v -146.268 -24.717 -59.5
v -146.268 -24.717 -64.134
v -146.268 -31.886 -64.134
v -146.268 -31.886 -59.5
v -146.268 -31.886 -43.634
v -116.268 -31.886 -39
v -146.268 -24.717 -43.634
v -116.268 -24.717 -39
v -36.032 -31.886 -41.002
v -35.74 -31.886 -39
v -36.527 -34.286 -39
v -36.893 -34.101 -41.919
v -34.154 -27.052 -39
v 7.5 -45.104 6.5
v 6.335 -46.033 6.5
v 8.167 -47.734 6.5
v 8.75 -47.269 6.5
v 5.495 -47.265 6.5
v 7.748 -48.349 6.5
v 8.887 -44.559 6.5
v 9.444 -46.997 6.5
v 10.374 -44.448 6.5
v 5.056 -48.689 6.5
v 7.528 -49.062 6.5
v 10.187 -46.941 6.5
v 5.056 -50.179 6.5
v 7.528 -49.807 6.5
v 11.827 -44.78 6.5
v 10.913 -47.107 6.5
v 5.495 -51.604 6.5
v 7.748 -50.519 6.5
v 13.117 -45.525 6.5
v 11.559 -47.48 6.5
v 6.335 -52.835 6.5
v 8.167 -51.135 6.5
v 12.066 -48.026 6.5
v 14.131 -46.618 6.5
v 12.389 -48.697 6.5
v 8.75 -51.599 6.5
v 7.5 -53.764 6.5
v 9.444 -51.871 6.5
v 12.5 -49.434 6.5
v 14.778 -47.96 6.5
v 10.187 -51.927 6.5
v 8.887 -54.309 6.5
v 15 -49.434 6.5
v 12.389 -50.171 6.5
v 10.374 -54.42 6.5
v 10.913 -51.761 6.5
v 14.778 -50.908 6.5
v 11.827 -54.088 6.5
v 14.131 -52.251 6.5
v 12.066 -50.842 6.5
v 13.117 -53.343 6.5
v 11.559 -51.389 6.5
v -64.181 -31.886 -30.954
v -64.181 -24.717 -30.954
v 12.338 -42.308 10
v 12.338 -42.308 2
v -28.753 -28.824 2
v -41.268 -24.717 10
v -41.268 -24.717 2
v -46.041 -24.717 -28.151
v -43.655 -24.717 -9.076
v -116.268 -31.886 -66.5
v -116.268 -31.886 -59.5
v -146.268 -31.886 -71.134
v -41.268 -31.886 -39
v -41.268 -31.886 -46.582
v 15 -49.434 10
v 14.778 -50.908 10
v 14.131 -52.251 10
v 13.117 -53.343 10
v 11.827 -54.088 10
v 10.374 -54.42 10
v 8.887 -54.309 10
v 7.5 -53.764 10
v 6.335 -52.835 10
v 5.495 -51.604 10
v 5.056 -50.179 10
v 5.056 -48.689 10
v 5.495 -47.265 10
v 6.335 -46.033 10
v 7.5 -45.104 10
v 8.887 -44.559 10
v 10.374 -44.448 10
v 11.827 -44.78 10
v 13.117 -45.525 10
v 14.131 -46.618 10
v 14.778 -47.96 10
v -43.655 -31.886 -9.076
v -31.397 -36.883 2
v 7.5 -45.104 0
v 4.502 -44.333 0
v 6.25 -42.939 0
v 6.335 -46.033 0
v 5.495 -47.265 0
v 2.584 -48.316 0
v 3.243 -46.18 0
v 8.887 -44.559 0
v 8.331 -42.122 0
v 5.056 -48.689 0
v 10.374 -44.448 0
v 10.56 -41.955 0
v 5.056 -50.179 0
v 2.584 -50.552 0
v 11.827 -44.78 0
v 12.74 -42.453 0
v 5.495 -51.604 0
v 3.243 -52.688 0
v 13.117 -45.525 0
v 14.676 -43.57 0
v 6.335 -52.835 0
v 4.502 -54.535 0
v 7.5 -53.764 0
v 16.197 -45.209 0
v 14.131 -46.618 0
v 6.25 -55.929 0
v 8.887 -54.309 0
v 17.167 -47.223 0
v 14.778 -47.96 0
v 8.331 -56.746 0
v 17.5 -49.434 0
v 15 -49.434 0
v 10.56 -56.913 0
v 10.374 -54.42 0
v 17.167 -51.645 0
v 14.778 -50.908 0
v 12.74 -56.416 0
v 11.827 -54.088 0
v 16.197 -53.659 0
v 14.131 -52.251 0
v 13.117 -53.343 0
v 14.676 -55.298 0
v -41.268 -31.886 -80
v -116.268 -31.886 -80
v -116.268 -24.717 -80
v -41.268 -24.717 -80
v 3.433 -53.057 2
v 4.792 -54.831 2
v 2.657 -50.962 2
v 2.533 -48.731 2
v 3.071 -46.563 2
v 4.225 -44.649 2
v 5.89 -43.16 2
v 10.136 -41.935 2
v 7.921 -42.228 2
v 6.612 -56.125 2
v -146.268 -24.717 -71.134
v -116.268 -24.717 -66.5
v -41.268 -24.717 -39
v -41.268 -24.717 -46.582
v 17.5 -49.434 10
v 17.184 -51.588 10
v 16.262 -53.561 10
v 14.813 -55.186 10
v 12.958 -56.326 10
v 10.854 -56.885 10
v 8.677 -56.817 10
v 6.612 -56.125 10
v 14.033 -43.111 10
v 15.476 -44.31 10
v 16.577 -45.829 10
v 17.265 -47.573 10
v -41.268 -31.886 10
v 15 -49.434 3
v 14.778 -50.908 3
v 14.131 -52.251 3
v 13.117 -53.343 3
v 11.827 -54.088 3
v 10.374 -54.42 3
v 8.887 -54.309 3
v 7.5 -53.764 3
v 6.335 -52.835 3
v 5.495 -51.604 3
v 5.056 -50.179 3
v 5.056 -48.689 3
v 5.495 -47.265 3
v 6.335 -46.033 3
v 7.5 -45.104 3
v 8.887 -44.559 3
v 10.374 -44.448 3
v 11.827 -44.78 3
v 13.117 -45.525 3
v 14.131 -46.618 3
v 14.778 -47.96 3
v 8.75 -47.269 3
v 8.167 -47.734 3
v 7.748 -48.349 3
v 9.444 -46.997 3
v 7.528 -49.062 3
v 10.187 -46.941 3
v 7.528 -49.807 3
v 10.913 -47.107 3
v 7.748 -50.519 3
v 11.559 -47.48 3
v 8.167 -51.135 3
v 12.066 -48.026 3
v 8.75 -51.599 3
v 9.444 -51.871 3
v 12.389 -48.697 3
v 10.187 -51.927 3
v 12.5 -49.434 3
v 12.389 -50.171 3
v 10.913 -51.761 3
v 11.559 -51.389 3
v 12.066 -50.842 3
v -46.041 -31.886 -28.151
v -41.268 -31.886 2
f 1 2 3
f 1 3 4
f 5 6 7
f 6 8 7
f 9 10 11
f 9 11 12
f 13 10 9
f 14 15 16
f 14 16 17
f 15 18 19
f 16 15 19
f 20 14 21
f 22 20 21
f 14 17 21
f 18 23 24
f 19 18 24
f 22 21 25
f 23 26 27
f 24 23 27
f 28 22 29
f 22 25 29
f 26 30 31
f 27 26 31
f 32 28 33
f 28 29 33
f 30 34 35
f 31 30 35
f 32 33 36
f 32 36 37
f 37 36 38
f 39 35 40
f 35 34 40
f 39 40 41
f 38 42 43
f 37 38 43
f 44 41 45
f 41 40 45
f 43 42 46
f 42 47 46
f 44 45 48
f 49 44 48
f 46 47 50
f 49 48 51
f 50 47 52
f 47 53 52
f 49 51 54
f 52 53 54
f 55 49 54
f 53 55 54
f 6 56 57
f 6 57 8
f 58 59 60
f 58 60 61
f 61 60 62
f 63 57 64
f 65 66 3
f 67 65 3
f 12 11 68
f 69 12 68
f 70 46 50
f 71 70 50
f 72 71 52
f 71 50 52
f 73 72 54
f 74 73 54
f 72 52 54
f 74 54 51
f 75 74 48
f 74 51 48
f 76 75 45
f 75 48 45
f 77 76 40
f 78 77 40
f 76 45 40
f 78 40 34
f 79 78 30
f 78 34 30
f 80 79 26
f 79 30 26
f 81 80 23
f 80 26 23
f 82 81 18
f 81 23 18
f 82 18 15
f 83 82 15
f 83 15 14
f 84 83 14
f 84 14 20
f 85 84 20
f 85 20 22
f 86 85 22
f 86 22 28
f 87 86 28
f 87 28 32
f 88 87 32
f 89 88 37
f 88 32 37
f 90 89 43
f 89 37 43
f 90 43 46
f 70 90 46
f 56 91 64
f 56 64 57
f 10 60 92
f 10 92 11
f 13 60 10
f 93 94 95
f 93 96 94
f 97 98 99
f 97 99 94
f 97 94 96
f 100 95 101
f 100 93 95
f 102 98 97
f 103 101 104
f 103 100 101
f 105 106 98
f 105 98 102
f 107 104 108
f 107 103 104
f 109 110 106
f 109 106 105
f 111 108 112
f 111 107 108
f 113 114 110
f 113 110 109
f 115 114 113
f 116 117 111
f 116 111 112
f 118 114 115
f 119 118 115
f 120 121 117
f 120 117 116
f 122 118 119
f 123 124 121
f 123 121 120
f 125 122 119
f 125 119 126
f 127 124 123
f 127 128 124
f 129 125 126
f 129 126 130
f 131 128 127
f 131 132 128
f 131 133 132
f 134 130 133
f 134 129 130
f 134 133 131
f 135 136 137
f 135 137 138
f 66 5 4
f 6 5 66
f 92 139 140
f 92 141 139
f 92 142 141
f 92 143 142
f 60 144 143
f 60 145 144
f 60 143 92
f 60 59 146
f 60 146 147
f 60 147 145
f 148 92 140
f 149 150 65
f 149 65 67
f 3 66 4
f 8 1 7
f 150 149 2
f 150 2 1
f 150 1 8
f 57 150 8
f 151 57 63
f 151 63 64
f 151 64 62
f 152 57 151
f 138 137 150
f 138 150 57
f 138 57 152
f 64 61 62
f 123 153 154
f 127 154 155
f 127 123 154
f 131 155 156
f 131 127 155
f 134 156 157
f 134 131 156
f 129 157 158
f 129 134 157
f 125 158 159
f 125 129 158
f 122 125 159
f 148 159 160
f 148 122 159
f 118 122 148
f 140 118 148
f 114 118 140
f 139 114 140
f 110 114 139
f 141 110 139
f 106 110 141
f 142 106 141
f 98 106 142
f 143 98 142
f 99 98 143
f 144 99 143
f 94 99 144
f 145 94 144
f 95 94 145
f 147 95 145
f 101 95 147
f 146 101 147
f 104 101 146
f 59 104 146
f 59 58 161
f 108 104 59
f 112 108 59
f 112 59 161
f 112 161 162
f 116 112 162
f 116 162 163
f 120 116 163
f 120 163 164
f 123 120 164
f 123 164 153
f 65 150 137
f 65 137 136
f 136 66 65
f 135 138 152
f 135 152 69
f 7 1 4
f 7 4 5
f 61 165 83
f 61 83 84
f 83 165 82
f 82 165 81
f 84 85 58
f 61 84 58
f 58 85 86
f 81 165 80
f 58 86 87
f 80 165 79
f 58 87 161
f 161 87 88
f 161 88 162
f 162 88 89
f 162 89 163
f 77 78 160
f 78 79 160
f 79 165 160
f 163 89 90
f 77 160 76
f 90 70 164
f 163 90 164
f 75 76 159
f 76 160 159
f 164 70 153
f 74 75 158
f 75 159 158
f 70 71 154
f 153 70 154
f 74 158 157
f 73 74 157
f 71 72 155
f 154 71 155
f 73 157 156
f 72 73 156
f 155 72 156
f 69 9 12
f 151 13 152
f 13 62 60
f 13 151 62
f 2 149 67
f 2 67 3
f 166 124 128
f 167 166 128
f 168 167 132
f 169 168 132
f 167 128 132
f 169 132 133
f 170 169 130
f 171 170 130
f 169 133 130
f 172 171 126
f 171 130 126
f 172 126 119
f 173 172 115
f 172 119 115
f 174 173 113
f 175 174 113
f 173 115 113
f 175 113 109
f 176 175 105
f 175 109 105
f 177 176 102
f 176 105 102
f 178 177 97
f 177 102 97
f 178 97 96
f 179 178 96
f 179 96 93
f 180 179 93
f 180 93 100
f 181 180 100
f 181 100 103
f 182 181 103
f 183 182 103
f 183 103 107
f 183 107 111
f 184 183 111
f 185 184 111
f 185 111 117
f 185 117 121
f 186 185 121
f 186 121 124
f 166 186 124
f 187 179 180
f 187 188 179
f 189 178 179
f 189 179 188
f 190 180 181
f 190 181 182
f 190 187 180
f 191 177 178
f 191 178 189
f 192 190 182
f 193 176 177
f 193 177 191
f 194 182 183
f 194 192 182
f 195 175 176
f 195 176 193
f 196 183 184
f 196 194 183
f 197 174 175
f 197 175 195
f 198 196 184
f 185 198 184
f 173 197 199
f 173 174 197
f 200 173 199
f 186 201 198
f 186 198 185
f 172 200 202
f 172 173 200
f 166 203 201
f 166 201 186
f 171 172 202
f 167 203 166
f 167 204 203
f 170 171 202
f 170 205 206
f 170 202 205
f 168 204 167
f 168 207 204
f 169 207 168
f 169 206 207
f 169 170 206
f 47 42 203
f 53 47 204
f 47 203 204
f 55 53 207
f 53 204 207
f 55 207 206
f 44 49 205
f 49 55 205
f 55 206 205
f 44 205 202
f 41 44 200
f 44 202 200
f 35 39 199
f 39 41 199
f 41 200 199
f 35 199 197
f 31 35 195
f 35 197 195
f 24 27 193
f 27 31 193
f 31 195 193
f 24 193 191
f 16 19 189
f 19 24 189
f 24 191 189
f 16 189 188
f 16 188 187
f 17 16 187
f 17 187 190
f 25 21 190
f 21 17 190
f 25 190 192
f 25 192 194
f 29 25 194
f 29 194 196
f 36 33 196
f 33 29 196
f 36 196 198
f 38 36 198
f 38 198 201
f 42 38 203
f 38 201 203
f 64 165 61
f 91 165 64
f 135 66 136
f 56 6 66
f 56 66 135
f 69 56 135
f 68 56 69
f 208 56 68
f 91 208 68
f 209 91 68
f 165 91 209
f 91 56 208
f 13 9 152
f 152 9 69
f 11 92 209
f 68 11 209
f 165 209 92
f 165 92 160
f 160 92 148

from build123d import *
from build123d.topology import SkipClean

# Parameters (mm, degrees)
CROQUIS1_R                  = 6
CROQUIS1_R_2                = 5
SALIENTE_EXTRUIR1_DEPTH     = 10
SALIENTE_EXTRUIR2_START     = -7
CROQUIS2_R                  = 5
CROQUIS2_R_2                = 2.5
SALIENTE_EXTRUIR2_DEPTH     = 7
CORTAR_EXTRUIR2_START       = -3.5
CROQUIS3_R                  = 5
CORTAR_EXTRUIR2_DEPTH       = 3.5
CROQUIS4_R                  = 6
CORTAR_EXTRUIR3_DEPTH       = 0.8
SALIENTE_EXTRUIR3_START     = -10
CROQUIS5_R                  = 7.5
CROQUIS5_R_2                = 5
SALIENTE_EXTRUIR3_DEPTH     = 10
SALIENTE_EXTRUIR4_START     = -8
SALIENTE_EXTRUIR4_DEPTH     = 8
CROQUIS7_W                  = 75
CROQUIS7_H                  = 7.168726593
SALIENTE_EXTRUIR5_DEPTH     = 90
SALIENTE_EXTRUIR6_DEPTH     = 7.168727
SALIENTE_EXTRUIR9_DEPTH     = 41
SALIENTE_EXTRUIR10_DEPTH    = 49
CORTAR_EXTRUIR4_START       = -41
CORTAR_EXTRUIR4_DEPTH       = 41
CORTAR_EXTRUIR5_DEPTH       = 143.675260973
CORTAR_EXTRUIR7_DEPTH       = 145.942427149
CORTAR_EXTRUIR8_DEPTH       = 145.942427149
CORTAR_EXTRUIR9_DEPTH       = 144.33727388
CROQUIS17_W                 = 30
CROQUIS17_H                 = 20.5
SALIENTE_EXTRUIR12_DEPTH    = 7.168727
CORTAR_EXTRUIR10_DEPTH      = 170.800324178
SALIENTE_EXTRUIR13_DEPTH    = 7.168723
SALIENTE_EXTRUIR14_DEPTH    = 7.168723
CORTAR_EXTRUIR12_DEPTH      = 171.613176039
CORTAR_EXTRUIR12_DEPTH_BACK = 171.613176039
SALIENTE_EXTRUIR15_DEPTH    = 7.168727
SALIENTE_EXTRUIR16_DEPTH    = 7.168727
SALIENTE_EXTRUIR17_DEPTH    = 2.399783
CORTAR_EXTRUIR13_DEPTH      = 165.428416042
CORTAR_EXTRUIR14_DEPTH      = 165.428416042
CORTAR_EXTRUIR15_DEPTH      = 150.41186397
CORTAR_EXTRUIR16_DEPTH      = 159.45665044


with BuildPart() as part:
    # Croquis1 → Saliente-Extruir1 (new body)
    with BuildSketch(Plane.XY):
        with Locations((10, 0)):
            Circle(CROQUIS1_R)
        with Locations((10, 0)):
            Circle(CROQUIS1_R_2, mode=Mode.SUBTRACT)
    extrude(amount=SALIENTE_EXTRUIR1_DEPTH)

    # Croquis2 → Saliente-Extruir2 (add)
    with BuildSketch(Plane.XY.offset(10).offset(SALIENTE_EXTRUIR2_START)):
        with Locations((10, 0)):
            Circle(CROQUIS2_R)
        with Locations((10, 0)):
            Circle(CROQUIS2_R_2, mode=Mode.SUBTRACT)
    extrude(amount=SALIENTE_EXTRUIR2_DEPTH)

    # Croquis3 → Cortar-Extruir2 (cut)
    with BuildSketch(Plane.XY.offset(10).offset(CORTAR_EXTRUIR2_START)):
        with Locations((10, 0)):
            Circle(CROQUIS3_R)
    extrude(amount=CORTAR_EXTRUIR2_DEPTH, mode=Mode.SUBTRACT)

    # Croquis4 → Cortar-Extruir3 (cut)
    with BuildSketch(Plane(origin=(0, 0, 0), x_dir=(-1, 0, 0), z_dir=(0, 0, -1))):
        with Locations((-10, 0)):
            Circle(CROQUIS4_R)
    extrude(amount=-CORTAR_EXTRUIR3_DEPTH, mode=Mode.SUBTRACT)

    # Croquis5 → Saliente-Extruir3 (add)
    with BuildSketch(Plane.XY.offset(10).offset(SALIENTE_EXTRUIR3_START)):
        with Locations((10, 0)):
            Circle(CROQUIS5_R)
        with Locations((10, 0)):
            Circle(CROQUIS5_R_2, mode=Mode.SUBTRACT)
    extrude(amount=SALIENTE_EXTRUIR3_DEPTH)

    # Croquis6 → Saliente-Extruir4 (add)
    with BuildSketch(Plane.XY.offset(10).offset(SALIENTE_EXTRUIR4_START)):
        with BuildLine():
            Line((-41.267602672, -17.548326339), (6.612435502, 6.691368079))
            ThreePointArc((6.612435502, 6.691368079), (3.071368624, -2.871248378), (12.338451231, -7.126124181))
            Line((12.338451231, -7.126124181), (-41.267602672, -24.717052932))
            Line((-41.267602672, -24.717052932), (-41.267602672, -17.548326339))
        make_face()
    extrude(amount=SALIENTE_EXTRUIR4_DEPTH)

    # Croquis7 → Saliente-Extruir5 (add)
    with BuildSketch(Plane.XY.offset(10)):
        with Locations((-78.767602672, -21.132689636)):
            Rectangle(CROQUIS7_W, CROQUIS7_H)
    extrude(amount=-SALIENTE_EXTRUIR5_DEPTH)

    # Croquis8 → Saliente-Extruir6 (add)
    with SkipClean():  # the faces are left unmerged after this step: merging them gives an invalid solid
        with BuildSketch(Plane.XZ.offset(24.717052932)):
            Polygon((-27.979148649, 2), (-41.267602672, -39), (-41.267602672, 2), align=None)
        extrude(amount=-SALIENTE_EXTRUIR6_DEPTH)

    # Croquis10 → Saliente-Extruir9 (add)
    with BuildSketch(Plane(origin=(0, 0, 2), x_dir=(-1, 0, 0), z_dir=(0, 0, -1))):
        Polygon((41.267602672, -17.548326339), (27.979148649, -17.548326339), (27.979148649, -10.820928511), align=None)
    extrude(amount=SALIENTE_EXTRUIR9_DEPTH)

    # Croquis11 → Saliente-Extruir10 (add)
    with BuildSketch(Plane(origin=(0, 0, -39), x_dir=(-1, 0, 0), z_dir=(0, 0, -1))):
        Polygon((41.267602672, -17.548326339), (41.267602672, -24.717052932), (27.979148649, -20.356421419), (27.979148649, -17.548326339), align=None)
    extrude(amount=-SALIENTE_EXTRUIR10_DEPTH)

    # Croquis12 → Cortar-Extruir4 (cut)
    with BuildSketch(Plane.XY.offset(2).offset(CORTAR_EXTRUIR4_START)):
        Polygon((-41.267602672, -24.717052932), (-27.979148649, -20.356421419), (-27.979148649, -24.717052932), align=None)
    extrude(amount=CORTAR_EXTRUIR4_DEPTH, mode=Mode.SUBTRACT)

    # Croquis13 → Cortar-Extruir5 (cut, through all)
    with BuildSketch(Plane(origin=(-1.347459035, 2.6616008, 0), x_dir=(0.89218241056854, 0.45167526639402034, 0), z_dir=(-0.45167526639402034, 0.89218241056854, 0))):
        Polygon((-29.850050056, -2), (-37.29721213, 39), (-29.850050056, 39), align=None)
    extrude(amount=-CORTAR_EXTRUIR5_DEPTH, mode=Mode.SUBTRACT)

    # Croquis14 → Cortar-Extruir7 (cut, through all)
    with BuildSketch(Plane(origin=(3.310603082, -10.088629756, 0), x_dir=(0.9501498907741007, 0.31179349746581414, 0), z_dir=(0.3117934974658141, -0.9501498907741006, 0))):
        Polygon((-29.95828018, 2), (-32.931384863, 2), (-36.10801617, -39), align=None)
    extrude(amount=-CORTAR_EXTRUIR7_DEPTH, mode=Mode.SUBTRACT)


with BuildPart() as cortar_extruir7_piece_1:
    # of the separate pieces the step leaves, piece 1, a body of its own (cortar_extruir7_pieces)
    add(part.part.solids().sort_by_distance((12.338451231, -7.126124181, 10))[0])


with BuildPart() as cortar_extruir7_piece_2:
    # of the separate pieces the step leaves, piece 2, a body of its own (cortar_extruir7_pieces)
    add(part.part.solids().sort_by_distance((-27.979148649, -20.356421419, -21.711689973))[0])


with BuildPart() as cortar_extruir8_tool:
    # Croquis15 → Cortar-Extruir8 (new, through all)
    with BuildSketch(Plane(origin=(3.310603082, -10.088629756, 0), x_dir=(0.9501498907741007, 0.31179349746581414, 0), z_dir=(0.3117934974658141, -0.9501498907741006, 0))):
        Polygon((-26.166370626, 2), (-33.745414131, 2), (-39.42969676, -39), (-33.745414131, -39), align=None)
    extrude(amount=-CORTAR_EXTRUIR8_DEPTH)


with BuildPart() as cortar_extruir7_piece_1_1:
    add(cortar_extruir7_piece_1.part)

    # Cortar-Extruir8: cut by cortar_extruir8_tool
    add(cortar_extruir8_tool.part, mode=Mode.SUBTRACT)

    # Croquis16 → Cortar-Extruir9 (cut, through all)
    with BuildSketch(Plane(origin=(0, -17.548326339, 0), x_dir=(1, 0, 0), z_dir=(0, 1, 0))):
        Polygon((-41.267602672, -10), (-46.041400107, 28.151463514), (-116.267602672, 39), (-116.267602672, -10), align=None)
    extrude(amount=-CORTAR_EXTRUIR9_DEPTH, mode=Mode.SUBTRACT)

    # Croquis17 → Saliente-Extruir12 (add)
    with SkipClean():  # the faces are left unmerged after this step: merging them gives an invalid solid
        with BuildSketch(Plane.XZ.offset(24.717052932)):
            with Locations((-131.267602672, -49.25)):
                Rectangle(CROQUIS17_W, CROQUIS17_H)
        extrude(amount=-SALIENTE_EXTRUIR12_DEPTH)

    # Croquis18 → Cortar-Extruir10 (cut, through all)
    with SkipClean():  # the faces are left unmerged after this step: merging them gives an invalid solid
        with BuildSketch(Plane.XZ.offset(24.717052932)):
            Polygon((-146.267602672, -59.5), (-116.267602672, -59.5), (-146.267602672, -64.144245374), align=None)
            Polygon((-116.267602672, -39), (-146.267602672, -43.634396888), (-146.267602672, -39), align=None)
        extrude(amount=-CORTAR_EXTRUIR10_DEPTH, mode=Mode.SUBTRACT)

    # Croquis19 → Saliente-Extruir13 (add)
    with SkipClean():  # the faces are left unmerged after this step: merging them gives an invalid solid
        with BuildSketch(Plane.XZ.offset(24.717052932)):
            Polygon((-146.267602672, -59.5), (-116.267602672, -59.5), (-146.267602672, -64.134396888), align=None)
        extrude(amount=-SALIENTE_EXTRUIR13_DEPTH)

    # Croquis20 → Saliente-Extruir14 (add)
    with SkipClean():  # the faces are left unmerged after this step: merging them gives an invalid solid
        with BuildSketch(Plane.XZ.offset(24.717052932)):
            Polygon((-146.267602672, -64.134396888), (-116.267602672, -59.5), (-116.267602672, -66.5), (-146.267602672, -71.134396888), align=None)
        extrude(amount=-SALIENTE_EXTRUIR14_DEPTH)

    # Simetría5: Cortar-Extruir7 piece 1 across plane


with BuildPart() as cortar_extruir7_piece_2_1:
    add(cortar_extruir7_piece_2.part)

    # Cortar-Extruir8: cut by cortar_extruir8_tool
    add(cortar_extruir8_tool.part, mode=Mode.SUBTRACT)


with BuildPart() as cortar_extruir7_piece_1_2:
    with SkipClean():  # the faces are left unmerged after this step: merging them gives an invalid solid
        add(cortar_extruir7_piece_1_1.part)
        add(cortar_extruir7_piece_1_1.part.mirror(Plane(origin=(-41.267602672, -24.717052932, -80), x_dir=(0, 0, 1), z_dir=(0, 1, 0))))

    # Croquis22 → Cortar-Extruir12 (cut, two sides: drawn at the far end of the back side and taken through both)
    with SkipClean():  # the faces are left unmerged after this step: merging them gives an invalid solid
        with BuildSketch(Plane(origin=(3.174348647, 0, -20.548619752), x_dir=(0.988277380271317, 0, 0.15266898717179916), z_dir=(-0.15266898717179916, 0, 0.988277380271317)).offset(-CORTAR_EXTRUIR12_DEPTH_BACK)):
            Polygon((-151.214582366, -24.717052932), (-160.929410211, -24.717052932), (-160.929410211, 29.151790767), (25.906832494, 29.151790767), (25.906832494, -24.717052932), align=None)
        extrude(amount=CORTAR_EXTRUIR12_DEPTH + CORTAR_EXTRUIR12_DEPTH_BACK, mode=Mode.SUBTRACT)

    # Croquis25 → Saliente-Extruir15 (add)
    with SkipClean():  # the faces are left unmerged after this step: merging them gives an invalid solid
        with BuildSketch(Plane.XZ.offset(31.885779526)):
            Polygon((-43.654501389, -9.075731757), (-64.181393268, -30.953727775), (-46.041400107, -28.151463514), align=None)
        extrude(amount=-SALIENTE_EXTRUIR15_DEPTH)

    # Croquis26 → Saliente-Extruir16 (add)
    with SkipClean():  # the faces are left unmerged after this step: merging them gives an invalid solid
        with BuildSketch(Plane.XZ.offset(31.885779526)):
            Polygon((-34.153518988, -39), (-41.267602672, -46.58234103), (-41.267602672, -39), align=None)
        extrude(amount=-SALIENTE_EXTRUIR16_DEPTH)

    # Croquis27 → Saliente-Extruir17 (add)
    with SkipClean():  # the faces are left unmerged after this step: merging them gives an invalid solid
        with BuildSketch(Plane.XZ.offset(31.885779526)):
            Polygon((-41.267602672, -39), (-34.153518988, -39), (-41.267602672, -46.58234103), align=None)
        extrude(amount=SALIENTE_EXTRUIR17_DEPTH)

    # Croquis28 → Cortar-Extruir13 (cut, through all)
    with SkipClean():  # the faces are left unmerged after this step: merging them gives an invalid solid
        with BuildSketch(Plane.XY.offset(-39)):
            Polygon((-41.267602672, -31.885779526), (-41.267602672, -34.285562838), (-36.527373087, -34.285562838), align=None)
            Polygon((-41.267602672, -24.717052932), (-34.153518988, -24.717052932), (-34.153518988, -27.051553051), align=None)
        extrude(amount=-CORTAR_EXTRUIR13_DEPTH, mode=Mode.SUBTRACT)

    # Croquis29 → Cortar-Extruir14 (cut, through all)
    with SkipClean():  # the faces are left unmerged after this step: merging them gives an invalid solid
        with BuildSketch(Plane.XY.offset(-39)):
            Polygon((-34.153518988, -27.051553051), (-36.527373087, -34.285562838), (-34.153518988, -34.285562838), align=None)
        extrude(amount=-CORTAR_EXTRUIR14_DEPTH, mode=Mode.SUBTRACT)

    # Croquis30 → Cortar-Extruir15 (cut, through all)
    with SkipClean():  # the faces are left unmerged after this step: merging them gives an invalid solid
        with BuildSketch(Plane(origin=(-21.268253266, -42.010627722, 0), x_dir=(0.8921824105685466, -0.4516752663940073, 0), z_dir=(-0.4516752663940073, -0.8921824105685466, 0))):
            Polygon((-17.103139044, -39), (-17.103139044, -41.530103964), (-17.512588728, -41.919452496), align=None)
        extrude(amount=-CORTAR_EXTRUIR15_DEPTH, mode=Mode.SUBTRACT)

    # Croquis33 → Cortar-Extruir16 (cut, through all)
    with SkipClean():  # the faces are left unmerged after this step: merging them gives an invalid solid
        with BuildSketch(Plane(origin=(-11.334278343, -34.539730358, 0), x_dir=(0.9501498907741053, -0.31179349746580015, 0), z_dir=(0.31179349746580015, 0.9501498907741053, 0))):
            Polygon((-24.016463998, 39), (-24.421219928, 41.919452496), (-24.016463998, 40.933309055), align=None)
        extrude(amount=-CORTAR_EXTRUIR16_DEPTH, mode=Mode.SUBTRACT)


solid = cortar_extruir7_piece_1_2.part
